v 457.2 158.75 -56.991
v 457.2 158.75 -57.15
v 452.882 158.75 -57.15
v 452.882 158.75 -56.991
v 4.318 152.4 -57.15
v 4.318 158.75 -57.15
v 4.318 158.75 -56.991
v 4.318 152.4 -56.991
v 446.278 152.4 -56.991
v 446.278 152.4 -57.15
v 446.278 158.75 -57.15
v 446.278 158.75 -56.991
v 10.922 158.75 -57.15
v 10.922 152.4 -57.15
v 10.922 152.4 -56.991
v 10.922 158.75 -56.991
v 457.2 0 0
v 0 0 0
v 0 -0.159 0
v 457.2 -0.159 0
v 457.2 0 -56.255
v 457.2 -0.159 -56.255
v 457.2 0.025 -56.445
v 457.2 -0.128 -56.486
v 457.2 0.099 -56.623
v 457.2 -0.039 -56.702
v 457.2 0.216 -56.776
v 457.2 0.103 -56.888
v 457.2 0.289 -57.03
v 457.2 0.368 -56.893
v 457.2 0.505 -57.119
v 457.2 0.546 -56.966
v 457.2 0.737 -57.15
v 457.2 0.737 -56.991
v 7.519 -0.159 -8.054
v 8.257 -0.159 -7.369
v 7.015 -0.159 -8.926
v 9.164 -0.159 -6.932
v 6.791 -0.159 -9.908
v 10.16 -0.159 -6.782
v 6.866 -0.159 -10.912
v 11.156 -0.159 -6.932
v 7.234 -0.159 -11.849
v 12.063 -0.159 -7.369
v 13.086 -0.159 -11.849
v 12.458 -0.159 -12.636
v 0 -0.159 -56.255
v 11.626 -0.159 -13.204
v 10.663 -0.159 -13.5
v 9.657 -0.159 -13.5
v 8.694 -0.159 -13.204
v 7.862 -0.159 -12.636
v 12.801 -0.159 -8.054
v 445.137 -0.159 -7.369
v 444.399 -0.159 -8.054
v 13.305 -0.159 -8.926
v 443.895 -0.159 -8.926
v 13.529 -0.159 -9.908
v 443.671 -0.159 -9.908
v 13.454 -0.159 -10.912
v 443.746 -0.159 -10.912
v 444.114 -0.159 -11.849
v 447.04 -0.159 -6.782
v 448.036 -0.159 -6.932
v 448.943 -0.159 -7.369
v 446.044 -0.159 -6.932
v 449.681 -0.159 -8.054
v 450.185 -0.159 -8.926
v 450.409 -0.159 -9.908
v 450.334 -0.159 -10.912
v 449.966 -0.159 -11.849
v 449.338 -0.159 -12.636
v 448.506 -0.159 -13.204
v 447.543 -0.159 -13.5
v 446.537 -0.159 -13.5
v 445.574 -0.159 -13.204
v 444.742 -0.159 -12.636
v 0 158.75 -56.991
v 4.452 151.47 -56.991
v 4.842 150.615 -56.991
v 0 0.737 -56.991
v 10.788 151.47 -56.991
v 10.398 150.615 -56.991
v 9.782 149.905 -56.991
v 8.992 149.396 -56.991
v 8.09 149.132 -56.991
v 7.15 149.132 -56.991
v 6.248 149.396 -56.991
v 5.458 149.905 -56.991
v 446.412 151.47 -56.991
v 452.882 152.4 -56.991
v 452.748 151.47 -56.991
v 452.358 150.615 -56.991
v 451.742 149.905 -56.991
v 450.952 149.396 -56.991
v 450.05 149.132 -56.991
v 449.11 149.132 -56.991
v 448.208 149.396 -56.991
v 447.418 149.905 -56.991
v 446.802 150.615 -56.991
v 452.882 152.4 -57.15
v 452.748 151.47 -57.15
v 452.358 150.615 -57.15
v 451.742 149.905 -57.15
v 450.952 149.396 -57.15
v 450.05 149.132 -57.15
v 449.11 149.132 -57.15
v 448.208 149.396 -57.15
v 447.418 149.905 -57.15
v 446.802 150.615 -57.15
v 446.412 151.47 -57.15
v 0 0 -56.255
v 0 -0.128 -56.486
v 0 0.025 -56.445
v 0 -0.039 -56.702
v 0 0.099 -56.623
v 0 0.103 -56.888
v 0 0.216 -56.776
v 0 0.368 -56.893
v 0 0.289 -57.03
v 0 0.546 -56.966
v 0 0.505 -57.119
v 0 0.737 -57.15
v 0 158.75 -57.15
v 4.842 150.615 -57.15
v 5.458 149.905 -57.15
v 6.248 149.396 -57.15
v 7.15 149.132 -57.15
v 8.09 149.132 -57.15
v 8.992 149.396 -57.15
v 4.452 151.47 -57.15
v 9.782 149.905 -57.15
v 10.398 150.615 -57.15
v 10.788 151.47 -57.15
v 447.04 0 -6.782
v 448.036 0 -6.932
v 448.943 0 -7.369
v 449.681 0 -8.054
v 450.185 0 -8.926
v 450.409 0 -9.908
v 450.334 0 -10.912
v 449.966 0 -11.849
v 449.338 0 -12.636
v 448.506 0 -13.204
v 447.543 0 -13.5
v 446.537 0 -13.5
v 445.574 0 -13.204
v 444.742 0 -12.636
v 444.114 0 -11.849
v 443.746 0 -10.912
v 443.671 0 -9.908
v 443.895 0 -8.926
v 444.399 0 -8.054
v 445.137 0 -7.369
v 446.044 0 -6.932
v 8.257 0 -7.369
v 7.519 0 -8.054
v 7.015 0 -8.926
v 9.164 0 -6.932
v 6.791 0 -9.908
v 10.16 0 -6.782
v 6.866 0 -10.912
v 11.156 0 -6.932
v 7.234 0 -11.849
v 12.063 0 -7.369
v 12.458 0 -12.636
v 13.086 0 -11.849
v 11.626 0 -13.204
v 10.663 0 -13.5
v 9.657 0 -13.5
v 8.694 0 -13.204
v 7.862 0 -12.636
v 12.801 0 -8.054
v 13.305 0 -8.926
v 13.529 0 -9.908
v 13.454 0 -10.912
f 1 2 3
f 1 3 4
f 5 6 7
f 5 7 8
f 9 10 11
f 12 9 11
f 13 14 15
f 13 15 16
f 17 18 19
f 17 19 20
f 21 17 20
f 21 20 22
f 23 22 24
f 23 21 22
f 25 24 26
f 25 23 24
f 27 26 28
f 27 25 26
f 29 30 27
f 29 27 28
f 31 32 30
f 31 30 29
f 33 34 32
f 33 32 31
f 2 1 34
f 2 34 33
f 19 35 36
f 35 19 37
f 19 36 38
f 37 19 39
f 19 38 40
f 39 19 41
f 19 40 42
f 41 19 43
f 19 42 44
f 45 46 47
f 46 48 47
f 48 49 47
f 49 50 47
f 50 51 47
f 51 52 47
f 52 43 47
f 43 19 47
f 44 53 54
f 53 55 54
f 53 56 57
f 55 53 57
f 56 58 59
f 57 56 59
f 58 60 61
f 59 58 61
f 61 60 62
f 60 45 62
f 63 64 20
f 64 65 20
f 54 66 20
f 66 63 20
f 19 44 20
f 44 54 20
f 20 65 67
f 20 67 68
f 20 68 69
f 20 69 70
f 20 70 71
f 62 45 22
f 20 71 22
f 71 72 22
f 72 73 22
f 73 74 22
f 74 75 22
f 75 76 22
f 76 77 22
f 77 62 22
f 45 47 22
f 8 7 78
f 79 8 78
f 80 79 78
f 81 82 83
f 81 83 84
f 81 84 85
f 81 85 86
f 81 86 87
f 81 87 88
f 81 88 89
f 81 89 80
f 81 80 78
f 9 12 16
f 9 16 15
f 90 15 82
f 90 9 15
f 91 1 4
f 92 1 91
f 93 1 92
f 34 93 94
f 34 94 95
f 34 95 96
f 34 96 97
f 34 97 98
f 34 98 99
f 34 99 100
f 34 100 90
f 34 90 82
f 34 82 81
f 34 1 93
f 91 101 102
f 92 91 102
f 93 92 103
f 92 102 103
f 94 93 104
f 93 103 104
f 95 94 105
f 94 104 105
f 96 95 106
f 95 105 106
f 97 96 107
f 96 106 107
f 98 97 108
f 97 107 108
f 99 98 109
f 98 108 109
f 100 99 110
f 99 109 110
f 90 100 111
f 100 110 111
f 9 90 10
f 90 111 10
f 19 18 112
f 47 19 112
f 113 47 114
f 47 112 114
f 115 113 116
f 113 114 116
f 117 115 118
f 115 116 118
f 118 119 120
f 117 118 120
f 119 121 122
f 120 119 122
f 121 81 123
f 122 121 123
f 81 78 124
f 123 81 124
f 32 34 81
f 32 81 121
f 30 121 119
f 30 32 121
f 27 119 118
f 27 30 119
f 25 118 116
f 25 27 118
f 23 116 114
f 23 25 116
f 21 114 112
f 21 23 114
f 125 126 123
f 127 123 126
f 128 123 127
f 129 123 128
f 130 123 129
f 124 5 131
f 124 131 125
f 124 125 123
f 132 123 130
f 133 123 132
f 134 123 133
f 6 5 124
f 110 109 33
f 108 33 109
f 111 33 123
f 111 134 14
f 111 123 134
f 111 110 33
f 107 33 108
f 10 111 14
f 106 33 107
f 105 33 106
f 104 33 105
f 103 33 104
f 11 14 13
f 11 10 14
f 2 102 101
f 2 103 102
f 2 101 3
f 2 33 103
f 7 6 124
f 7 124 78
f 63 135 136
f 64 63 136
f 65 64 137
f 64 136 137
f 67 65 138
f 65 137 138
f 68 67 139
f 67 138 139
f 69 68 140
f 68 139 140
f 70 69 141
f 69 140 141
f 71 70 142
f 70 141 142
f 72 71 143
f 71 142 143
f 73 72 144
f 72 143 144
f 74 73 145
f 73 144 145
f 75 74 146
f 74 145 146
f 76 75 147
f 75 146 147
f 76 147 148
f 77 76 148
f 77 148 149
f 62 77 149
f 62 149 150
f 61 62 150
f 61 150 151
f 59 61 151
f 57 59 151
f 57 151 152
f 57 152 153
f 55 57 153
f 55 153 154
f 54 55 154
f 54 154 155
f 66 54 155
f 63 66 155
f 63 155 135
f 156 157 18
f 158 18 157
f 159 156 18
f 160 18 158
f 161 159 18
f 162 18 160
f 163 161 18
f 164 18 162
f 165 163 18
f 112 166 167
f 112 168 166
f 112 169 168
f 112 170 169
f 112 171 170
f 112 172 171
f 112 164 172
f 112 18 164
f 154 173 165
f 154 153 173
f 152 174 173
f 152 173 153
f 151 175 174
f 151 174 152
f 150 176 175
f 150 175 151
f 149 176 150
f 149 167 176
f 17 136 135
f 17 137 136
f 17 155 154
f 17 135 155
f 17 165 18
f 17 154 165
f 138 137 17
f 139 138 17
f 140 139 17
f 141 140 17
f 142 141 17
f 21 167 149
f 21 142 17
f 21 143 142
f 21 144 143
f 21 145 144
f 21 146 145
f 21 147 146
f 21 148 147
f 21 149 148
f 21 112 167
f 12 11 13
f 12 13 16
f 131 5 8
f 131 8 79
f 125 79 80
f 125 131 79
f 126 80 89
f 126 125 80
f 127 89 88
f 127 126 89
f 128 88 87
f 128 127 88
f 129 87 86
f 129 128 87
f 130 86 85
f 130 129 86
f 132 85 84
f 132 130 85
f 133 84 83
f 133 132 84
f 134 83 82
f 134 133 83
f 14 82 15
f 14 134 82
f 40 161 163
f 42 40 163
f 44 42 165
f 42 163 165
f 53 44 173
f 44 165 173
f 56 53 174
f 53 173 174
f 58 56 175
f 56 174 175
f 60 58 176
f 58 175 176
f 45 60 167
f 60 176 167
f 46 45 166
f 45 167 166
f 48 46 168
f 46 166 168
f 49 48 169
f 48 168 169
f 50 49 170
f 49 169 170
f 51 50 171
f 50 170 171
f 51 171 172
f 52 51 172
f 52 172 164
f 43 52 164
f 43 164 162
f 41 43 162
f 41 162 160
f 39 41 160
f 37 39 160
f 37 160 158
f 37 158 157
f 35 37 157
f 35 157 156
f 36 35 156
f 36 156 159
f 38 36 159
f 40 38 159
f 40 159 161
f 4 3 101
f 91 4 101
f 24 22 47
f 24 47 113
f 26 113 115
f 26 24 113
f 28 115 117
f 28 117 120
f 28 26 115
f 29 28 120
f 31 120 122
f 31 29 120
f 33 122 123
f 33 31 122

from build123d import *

# Parameters (mm, degrees)
SKETCH1_W                    = 457.2
SKETCH1_H                    = 57.15
BASE_FLANGE1_DEPTH           = 0.15875
EDGE_FLANGE1_STRIP_W         = 2.1082
EDGE_FLANGE1_STRIP_H         = 0.15875
EDGE_FLANGE1_STRIP_CUT_DEPTH = 457.2
EDGE_FLANGE1_DEPTH           = 457.2
CUT_EXTRUDE1_DEPTH           = 488.3392299
F_1_4_CLEARANCE_HOLE2_D      = 6.7564
F_1_4_CLEARANCE_HOLE2_DEPTH  = 25.4
F_1_4_CLEARANCE_HOLE2_TIP    = 2.029827343


# Sheet-metal steps are written as plain solids
with BuildPart() as part:
    # Sketch1 → Base-Flange1 (new body)
    with BuildSketch(Plane(origin=(0, 0, 0), x_dir=(1, 0, 0), z_dir=(0, 1, 0))):
        with Locations((228.6, 28.575)):
            Rectangle(SKETCH1_W, SKETCH1_H)
    extrude(amount=-BASE_FLANGE1_DEPTH)

    # Edge-Flange1 strip (across the edge) → Edge-Flange1 strip cut (cut)
    with BuildSketch(Plane(origin=(457.2, 0, -57.15), x_dir=(0, 0, 1), z_dir=(-1, 0, 0))):
        with Locations((-0.15875, -0.079375)):
            Rectangle(EDGE_FLANGE1_STRIP_W, EDGE_FLANGE1_STRIP_H)
    extrude(amount=EDGE_FLANGE1_STRIP_CUT_DEPTH, mode=Mode.SUBTRACT)

    # Edge-Flange1 section (across the edge) → Edge-Flange1 (add)
    with BuildSketch(Plane(origin=(457.2, 0, -57.15), x_dir=(0, 0, 1), z_dir=(-1, 0, 0))):
        with BuildLine():
            Line((0, 0.7366), (0, 158.75))
            Line((0, 158.75), (0.15875, 158.75))
            Line((0.15875, 158.75), (0.15875, 0.7366))
            ThreePointArc((0.15875, 0.7366), (0.374495145, 0.215745145), (0.89535, 0))
            Line((0.89535, 0), (0.89535, -0.15875))
            ThreePointArc((0.89535, -0.15875), (0.262241943, 0.103491943), (0, 0.7366))
        make_face()
    extrude(amount=EDGE_FLANGE1_DEPTH)

    # Sketch9 → Cut-Extrude1 (cut, through all)
    with BuildSketch(Plane(origin=(0, 0, -57.15), x_dir=(-1, 0, 0), z_dir=(0, 0, -1))):
        with BuildLine():
            Line((-446.278, 152.4), (-446.278, 158.75))
            Line((-446.278, 158.75), (-452.882, 158.75))
            Line((-452.882, 158.75), (-452.882, 152.4))
            ThreePointArc((-452.882, 152.4), (-449.58, 149.098), (-446.278, 152.4))
        make_face()
        with BuildLine():
            Line((-10.922, 152.4), (-10.922, 158.75))
            Line((-10.922, 158.75), (-4.318, 158.75))
            Line((-4.318, 158.75), (-4.318, 152.4))
            ThreePointArc((-4.318, 152.4), (-7.62, 149.098), (-10.922, 152.4))
        make_face()
    extrude(amount=-CUT_EXTRUDE1_DEPTH, mode=Mode.SUBTRACT)

    # 1/4 Clearance Hole2
    with Locations(Plane(origin=(10.16, -0.15875, -10.16), x_dir=(0, 0, -1), z_dir=(0, -1, 0))):
        with Locations((0, 0), (0, 436.88)):
            Hole(F_1_4_CLEARANCE_HOLE2_D / 2, depth=F_1_4_CLEARANCE_HOLE2_DEPTH)
            with Locations((0, 0, -(F_1_4_CLEARANCE_HOLE2_DEPTH + F_1_4_CLEARANCE_HOLE2_TIP / 2))):  # 118° drill point
                Cone(0, F_1_4_CLEARANCE_HOLE2_D / 2, F_1_4_CLEARANCE_HOLE2_TIP, mode=Mode.SUBTRACT)


solid = part.part
